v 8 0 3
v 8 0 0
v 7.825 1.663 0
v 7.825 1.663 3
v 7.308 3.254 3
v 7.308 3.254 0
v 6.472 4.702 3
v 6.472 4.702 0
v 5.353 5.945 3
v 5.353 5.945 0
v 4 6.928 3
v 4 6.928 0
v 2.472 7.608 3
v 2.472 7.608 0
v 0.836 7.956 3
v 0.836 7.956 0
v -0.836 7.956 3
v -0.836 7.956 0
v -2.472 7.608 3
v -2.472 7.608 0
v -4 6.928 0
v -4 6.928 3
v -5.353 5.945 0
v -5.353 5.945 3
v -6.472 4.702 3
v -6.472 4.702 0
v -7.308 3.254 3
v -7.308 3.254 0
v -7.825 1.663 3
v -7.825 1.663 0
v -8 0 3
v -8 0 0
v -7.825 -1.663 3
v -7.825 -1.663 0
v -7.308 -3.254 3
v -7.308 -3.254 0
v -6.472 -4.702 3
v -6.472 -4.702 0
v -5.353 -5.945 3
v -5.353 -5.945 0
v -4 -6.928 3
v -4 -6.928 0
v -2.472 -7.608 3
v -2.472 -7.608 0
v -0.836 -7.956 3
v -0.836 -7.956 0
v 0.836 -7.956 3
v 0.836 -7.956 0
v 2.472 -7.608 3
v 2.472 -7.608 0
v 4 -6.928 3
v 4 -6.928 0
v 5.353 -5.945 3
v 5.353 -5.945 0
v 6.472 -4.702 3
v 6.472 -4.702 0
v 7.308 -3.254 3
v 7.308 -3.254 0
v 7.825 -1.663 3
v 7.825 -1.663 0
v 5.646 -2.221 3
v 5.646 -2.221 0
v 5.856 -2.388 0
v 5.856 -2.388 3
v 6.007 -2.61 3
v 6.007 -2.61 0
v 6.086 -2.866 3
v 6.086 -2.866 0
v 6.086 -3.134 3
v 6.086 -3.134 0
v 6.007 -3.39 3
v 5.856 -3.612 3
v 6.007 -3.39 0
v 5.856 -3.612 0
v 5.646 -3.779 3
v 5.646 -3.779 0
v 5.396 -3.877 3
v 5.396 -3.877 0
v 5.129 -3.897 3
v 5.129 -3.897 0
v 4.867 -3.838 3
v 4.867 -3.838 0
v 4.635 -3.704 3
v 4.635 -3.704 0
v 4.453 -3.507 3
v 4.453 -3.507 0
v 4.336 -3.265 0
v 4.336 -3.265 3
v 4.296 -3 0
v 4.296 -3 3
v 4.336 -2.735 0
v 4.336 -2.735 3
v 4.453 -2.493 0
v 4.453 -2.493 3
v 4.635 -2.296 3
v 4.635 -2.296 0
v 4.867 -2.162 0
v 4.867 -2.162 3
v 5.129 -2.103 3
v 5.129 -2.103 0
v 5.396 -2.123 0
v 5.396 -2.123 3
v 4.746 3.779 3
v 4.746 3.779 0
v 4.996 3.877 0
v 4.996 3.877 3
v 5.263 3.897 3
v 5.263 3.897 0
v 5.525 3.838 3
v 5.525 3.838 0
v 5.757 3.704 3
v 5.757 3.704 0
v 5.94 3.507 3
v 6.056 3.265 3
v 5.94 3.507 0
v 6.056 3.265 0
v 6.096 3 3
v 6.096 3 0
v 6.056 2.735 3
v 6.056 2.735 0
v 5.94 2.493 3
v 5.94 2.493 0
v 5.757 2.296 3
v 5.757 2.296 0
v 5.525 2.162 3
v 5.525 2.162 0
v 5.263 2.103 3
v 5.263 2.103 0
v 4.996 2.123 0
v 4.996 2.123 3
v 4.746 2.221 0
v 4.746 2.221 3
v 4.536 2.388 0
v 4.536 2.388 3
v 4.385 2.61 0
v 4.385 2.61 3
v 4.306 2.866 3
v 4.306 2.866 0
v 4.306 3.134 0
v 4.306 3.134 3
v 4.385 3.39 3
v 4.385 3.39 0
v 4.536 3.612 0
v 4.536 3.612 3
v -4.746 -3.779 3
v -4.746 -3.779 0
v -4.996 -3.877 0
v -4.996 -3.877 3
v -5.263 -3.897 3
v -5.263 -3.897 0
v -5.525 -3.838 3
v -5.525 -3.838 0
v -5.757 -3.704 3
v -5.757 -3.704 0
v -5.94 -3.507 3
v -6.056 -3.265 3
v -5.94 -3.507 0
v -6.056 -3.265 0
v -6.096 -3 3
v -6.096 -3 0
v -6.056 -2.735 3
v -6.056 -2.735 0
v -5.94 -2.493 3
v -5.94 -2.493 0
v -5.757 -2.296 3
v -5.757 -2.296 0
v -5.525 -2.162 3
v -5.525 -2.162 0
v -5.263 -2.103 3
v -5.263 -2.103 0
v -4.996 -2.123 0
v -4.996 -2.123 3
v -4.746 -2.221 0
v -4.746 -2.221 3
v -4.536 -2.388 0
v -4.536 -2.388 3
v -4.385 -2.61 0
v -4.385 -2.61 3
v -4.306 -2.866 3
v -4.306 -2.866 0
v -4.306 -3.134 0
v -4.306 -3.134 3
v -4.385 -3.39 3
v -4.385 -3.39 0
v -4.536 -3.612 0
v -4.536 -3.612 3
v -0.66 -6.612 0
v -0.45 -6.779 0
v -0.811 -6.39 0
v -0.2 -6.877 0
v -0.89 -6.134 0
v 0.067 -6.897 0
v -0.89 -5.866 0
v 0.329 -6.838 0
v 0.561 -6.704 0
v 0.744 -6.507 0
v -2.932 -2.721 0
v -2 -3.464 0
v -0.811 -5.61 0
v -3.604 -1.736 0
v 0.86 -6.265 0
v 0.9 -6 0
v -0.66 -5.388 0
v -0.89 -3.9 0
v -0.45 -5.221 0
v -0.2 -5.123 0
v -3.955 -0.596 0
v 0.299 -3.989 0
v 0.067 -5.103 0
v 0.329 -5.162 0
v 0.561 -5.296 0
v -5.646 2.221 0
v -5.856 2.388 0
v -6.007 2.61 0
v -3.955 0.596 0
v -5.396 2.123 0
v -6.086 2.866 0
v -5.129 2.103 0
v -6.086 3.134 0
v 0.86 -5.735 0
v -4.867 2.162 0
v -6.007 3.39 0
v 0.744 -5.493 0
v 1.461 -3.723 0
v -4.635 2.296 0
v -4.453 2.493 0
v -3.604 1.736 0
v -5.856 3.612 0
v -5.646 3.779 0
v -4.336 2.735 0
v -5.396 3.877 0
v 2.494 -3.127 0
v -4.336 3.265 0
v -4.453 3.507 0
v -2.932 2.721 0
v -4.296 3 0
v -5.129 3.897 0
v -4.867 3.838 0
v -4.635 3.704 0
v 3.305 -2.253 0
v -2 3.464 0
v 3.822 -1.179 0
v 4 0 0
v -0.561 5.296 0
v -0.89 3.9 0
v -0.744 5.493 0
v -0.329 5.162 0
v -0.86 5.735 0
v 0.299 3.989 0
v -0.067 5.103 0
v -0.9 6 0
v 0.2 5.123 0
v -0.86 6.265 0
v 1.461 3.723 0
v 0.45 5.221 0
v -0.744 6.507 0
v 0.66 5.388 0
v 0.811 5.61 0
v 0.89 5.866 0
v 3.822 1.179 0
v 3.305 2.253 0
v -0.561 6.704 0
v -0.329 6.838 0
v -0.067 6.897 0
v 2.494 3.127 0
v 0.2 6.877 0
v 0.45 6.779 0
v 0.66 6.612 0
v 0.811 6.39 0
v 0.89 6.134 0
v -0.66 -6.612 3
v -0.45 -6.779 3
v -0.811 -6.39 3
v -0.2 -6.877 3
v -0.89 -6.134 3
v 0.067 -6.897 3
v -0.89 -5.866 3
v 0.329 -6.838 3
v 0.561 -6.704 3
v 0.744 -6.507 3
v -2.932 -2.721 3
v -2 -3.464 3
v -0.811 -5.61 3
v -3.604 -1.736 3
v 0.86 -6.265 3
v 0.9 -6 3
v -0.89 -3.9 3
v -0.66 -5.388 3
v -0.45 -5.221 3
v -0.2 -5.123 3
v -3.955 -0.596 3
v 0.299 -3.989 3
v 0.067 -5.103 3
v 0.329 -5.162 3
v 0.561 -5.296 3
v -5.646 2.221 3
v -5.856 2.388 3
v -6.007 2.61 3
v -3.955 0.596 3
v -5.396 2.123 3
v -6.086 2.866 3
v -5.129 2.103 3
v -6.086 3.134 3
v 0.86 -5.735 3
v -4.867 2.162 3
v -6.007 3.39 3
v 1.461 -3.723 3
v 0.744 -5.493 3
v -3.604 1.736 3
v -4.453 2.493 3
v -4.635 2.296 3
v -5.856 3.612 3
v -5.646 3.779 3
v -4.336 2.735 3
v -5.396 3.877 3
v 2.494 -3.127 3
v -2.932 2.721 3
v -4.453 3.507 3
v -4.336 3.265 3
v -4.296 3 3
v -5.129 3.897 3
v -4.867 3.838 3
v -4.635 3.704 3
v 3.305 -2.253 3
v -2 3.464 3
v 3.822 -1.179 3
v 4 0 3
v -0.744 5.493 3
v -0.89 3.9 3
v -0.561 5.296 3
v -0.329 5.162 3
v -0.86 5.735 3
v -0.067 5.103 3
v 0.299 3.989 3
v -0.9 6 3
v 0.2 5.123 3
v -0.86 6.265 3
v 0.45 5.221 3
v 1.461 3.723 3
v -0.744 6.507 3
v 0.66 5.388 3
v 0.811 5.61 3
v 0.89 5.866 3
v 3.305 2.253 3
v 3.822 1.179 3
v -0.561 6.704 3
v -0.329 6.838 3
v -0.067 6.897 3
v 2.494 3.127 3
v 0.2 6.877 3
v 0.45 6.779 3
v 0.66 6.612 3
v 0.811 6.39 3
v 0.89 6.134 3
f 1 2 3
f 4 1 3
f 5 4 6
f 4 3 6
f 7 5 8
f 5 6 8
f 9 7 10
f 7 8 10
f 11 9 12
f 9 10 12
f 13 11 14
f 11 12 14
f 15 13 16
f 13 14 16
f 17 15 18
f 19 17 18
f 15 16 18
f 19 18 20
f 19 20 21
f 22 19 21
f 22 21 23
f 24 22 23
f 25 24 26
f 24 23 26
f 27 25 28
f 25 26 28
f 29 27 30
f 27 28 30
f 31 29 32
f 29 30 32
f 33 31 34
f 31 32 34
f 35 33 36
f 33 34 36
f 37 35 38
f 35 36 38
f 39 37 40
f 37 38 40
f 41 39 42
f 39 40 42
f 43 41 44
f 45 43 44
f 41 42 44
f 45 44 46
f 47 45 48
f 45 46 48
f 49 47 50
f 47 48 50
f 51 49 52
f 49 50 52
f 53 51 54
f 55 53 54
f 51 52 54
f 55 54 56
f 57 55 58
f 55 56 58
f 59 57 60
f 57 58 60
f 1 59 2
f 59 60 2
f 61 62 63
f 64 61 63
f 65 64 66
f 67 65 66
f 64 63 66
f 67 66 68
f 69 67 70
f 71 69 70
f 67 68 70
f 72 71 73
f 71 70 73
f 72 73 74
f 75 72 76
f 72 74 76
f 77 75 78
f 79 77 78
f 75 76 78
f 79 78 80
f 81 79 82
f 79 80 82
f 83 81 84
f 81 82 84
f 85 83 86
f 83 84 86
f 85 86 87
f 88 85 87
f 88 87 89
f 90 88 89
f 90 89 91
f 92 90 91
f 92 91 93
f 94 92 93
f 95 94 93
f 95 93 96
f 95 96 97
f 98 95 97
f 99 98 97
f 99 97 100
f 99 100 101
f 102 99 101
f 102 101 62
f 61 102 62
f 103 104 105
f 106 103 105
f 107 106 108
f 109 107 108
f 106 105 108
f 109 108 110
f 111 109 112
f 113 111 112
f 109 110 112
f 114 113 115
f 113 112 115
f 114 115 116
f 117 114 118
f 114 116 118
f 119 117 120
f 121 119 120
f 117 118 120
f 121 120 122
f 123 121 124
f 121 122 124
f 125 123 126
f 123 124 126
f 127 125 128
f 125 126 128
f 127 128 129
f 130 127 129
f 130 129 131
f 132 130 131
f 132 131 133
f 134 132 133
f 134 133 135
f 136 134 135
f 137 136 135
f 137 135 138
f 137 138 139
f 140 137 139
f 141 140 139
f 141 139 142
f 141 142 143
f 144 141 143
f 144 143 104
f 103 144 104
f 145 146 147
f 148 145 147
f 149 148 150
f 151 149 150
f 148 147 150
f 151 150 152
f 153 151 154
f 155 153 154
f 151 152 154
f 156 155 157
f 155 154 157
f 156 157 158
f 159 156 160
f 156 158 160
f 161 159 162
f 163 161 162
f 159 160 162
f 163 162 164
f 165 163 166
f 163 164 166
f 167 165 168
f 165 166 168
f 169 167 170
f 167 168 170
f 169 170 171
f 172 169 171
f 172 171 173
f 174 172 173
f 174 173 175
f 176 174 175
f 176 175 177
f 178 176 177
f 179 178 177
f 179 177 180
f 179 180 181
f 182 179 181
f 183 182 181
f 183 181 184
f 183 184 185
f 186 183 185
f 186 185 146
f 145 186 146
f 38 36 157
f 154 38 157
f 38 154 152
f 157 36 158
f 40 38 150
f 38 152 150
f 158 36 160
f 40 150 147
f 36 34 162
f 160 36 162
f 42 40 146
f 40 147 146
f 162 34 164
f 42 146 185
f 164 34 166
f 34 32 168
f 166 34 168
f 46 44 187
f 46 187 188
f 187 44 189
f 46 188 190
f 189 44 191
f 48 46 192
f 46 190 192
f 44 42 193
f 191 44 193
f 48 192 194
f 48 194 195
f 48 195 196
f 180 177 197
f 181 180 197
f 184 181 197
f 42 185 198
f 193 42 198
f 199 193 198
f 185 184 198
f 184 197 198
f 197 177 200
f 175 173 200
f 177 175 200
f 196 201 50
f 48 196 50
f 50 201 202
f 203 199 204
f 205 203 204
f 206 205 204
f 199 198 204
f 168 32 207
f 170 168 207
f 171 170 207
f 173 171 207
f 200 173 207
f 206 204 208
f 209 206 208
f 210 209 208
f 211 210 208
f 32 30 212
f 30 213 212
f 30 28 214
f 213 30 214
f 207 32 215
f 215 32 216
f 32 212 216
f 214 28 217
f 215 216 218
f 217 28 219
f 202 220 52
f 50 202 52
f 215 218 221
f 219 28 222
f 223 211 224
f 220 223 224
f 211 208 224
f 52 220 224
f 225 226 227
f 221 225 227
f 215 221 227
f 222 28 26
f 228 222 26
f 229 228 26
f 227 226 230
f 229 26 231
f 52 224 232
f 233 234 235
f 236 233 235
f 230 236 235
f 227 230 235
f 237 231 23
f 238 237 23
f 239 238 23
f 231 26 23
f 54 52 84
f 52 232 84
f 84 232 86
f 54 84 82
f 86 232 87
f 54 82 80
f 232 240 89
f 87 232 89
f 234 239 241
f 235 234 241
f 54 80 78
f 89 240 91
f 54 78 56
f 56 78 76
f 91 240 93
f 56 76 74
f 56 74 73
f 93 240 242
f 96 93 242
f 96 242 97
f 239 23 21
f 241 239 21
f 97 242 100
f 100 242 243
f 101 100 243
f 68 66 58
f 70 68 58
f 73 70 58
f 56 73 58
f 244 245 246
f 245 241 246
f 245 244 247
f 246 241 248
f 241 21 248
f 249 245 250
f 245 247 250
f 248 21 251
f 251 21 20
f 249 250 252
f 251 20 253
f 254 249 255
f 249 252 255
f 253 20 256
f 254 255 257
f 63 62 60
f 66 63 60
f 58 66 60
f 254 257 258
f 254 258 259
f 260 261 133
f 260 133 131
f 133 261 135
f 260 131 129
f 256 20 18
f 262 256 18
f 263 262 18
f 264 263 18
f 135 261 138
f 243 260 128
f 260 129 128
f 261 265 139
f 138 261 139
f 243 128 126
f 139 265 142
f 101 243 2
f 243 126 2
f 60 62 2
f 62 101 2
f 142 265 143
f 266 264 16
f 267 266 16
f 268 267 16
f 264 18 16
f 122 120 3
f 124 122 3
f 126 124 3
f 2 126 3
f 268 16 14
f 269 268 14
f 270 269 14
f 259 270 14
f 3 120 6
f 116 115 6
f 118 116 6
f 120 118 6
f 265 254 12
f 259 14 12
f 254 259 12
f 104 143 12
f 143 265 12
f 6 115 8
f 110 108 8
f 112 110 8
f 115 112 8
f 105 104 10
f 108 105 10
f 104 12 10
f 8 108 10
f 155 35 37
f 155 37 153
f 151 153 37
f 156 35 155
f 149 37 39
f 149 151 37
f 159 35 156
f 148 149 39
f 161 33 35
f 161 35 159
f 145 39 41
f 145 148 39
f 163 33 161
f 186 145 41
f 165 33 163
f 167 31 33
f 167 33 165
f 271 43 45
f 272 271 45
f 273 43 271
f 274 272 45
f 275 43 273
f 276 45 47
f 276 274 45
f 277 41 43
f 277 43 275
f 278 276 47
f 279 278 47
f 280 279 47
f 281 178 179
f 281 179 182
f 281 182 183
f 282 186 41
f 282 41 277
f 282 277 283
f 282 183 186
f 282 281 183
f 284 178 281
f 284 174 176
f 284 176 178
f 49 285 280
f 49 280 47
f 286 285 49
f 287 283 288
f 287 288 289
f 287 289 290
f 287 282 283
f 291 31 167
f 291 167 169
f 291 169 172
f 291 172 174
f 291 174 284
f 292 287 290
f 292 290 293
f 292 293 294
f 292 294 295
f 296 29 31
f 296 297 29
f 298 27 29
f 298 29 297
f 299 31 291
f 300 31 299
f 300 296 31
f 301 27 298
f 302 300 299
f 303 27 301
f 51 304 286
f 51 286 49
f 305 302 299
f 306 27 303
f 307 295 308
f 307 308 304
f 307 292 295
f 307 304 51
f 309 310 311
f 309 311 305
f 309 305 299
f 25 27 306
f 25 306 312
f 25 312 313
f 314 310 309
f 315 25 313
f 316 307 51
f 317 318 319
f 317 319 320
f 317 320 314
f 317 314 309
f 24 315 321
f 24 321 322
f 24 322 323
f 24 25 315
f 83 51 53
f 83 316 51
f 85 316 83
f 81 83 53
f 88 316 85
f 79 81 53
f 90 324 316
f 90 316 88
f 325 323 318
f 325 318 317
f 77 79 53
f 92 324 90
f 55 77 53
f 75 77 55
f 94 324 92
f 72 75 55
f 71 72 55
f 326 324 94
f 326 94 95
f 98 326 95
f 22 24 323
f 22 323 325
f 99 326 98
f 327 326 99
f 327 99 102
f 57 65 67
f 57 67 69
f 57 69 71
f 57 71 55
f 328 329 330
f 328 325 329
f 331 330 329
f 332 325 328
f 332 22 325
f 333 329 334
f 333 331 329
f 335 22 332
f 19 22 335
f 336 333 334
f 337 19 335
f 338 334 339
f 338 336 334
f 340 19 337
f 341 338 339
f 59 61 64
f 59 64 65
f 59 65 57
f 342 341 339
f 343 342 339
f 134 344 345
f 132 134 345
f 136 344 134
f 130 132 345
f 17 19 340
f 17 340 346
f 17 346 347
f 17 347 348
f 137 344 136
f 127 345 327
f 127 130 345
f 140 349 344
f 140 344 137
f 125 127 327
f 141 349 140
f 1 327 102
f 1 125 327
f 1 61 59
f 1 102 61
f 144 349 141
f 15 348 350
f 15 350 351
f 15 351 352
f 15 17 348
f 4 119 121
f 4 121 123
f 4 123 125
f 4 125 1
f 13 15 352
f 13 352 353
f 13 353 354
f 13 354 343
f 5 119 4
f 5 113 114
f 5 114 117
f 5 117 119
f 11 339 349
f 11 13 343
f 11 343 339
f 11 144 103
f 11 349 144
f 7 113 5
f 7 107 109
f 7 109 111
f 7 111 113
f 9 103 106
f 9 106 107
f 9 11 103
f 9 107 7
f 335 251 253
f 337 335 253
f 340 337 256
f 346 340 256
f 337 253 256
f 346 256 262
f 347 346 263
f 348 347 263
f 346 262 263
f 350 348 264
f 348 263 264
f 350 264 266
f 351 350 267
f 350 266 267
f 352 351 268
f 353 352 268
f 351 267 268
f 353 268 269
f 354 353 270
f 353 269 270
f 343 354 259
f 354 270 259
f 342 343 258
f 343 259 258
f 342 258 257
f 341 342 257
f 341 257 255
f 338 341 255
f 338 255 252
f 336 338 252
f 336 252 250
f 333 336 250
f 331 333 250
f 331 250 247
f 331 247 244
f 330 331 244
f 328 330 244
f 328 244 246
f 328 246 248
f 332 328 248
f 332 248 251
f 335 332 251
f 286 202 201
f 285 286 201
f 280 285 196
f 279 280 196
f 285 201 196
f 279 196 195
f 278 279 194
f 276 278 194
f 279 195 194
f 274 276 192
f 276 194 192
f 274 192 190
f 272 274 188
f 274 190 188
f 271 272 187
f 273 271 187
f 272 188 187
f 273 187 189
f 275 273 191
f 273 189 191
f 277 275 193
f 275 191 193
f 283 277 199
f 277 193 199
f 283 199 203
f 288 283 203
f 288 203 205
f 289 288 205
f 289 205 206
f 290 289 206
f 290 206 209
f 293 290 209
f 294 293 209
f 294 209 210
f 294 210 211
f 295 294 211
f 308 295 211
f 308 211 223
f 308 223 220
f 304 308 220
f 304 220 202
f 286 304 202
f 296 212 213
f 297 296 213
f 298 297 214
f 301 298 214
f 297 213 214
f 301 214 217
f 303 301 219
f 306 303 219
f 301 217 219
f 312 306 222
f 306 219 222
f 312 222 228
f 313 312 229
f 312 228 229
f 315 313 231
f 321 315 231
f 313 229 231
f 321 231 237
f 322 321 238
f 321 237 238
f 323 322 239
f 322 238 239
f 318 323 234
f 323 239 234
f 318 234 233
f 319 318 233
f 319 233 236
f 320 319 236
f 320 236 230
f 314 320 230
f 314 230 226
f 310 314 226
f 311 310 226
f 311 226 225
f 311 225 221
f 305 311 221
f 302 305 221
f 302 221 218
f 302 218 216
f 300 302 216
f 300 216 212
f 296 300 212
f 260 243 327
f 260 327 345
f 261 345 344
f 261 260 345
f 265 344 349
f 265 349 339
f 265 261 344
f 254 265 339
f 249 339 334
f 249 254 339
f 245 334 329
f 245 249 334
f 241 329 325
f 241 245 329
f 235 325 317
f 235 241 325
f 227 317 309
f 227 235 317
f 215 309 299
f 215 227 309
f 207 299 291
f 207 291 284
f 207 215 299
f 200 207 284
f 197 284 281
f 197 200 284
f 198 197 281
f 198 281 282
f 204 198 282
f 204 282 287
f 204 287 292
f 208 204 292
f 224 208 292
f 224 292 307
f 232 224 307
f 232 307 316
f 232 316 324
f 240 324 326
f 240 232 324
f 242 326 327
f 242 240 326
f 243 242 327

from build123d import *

# Parameters (mm, degrees)
ESBO_O1_R                 = 8
ESBO_O1_R_2               = 4
RESSALTO_EXTRUS_O1_DEPTH  = 3
FURO_COM_FOLGA_DE_M1_61_D = 1.8
PADR_OCIRCULAR1_COUNT     = 6


with BuildPart() as part:
    # Esboço1 → Ressalto-extrusão1 (new body)
    with BuildSketch(Plane.XY):
        Circle(ESBO_O1_R)
        Circle(ESBO_O1_R_2, mode=Mode.SUBTRACT)
    extrude(amount=RESSALTO_EXTRUS_O1_DEPTH)

    # Furo com folga de M1.61 (through all)
    with Locations(Plane(origin=(0, 6, 3), x_dir=(1, 0, 0), z_dir=(0, 0, 1))):
        with Locations((0, 0)):
            furo_com_folga_de_m1_61 = Hole(FURO_COM_FOLGA_DE_M1_61_D / 2)

    # PadrãoCircular1: Furo com folga de M1.61 ×6 about axis
    padr_ocircular1_axis = Axis((0, 0, 0), (0, 0, 1))
    for i in range(1, PADR_OCIRCULAR1_COUNT):
        add(furo_com_folga_de_m1_61.rotate(padr_ocircular1_axis, i * 360 / PADR_OCIRCULAR1_COUNT), mode=Mode.SUBTRACT)


solid = part.part
